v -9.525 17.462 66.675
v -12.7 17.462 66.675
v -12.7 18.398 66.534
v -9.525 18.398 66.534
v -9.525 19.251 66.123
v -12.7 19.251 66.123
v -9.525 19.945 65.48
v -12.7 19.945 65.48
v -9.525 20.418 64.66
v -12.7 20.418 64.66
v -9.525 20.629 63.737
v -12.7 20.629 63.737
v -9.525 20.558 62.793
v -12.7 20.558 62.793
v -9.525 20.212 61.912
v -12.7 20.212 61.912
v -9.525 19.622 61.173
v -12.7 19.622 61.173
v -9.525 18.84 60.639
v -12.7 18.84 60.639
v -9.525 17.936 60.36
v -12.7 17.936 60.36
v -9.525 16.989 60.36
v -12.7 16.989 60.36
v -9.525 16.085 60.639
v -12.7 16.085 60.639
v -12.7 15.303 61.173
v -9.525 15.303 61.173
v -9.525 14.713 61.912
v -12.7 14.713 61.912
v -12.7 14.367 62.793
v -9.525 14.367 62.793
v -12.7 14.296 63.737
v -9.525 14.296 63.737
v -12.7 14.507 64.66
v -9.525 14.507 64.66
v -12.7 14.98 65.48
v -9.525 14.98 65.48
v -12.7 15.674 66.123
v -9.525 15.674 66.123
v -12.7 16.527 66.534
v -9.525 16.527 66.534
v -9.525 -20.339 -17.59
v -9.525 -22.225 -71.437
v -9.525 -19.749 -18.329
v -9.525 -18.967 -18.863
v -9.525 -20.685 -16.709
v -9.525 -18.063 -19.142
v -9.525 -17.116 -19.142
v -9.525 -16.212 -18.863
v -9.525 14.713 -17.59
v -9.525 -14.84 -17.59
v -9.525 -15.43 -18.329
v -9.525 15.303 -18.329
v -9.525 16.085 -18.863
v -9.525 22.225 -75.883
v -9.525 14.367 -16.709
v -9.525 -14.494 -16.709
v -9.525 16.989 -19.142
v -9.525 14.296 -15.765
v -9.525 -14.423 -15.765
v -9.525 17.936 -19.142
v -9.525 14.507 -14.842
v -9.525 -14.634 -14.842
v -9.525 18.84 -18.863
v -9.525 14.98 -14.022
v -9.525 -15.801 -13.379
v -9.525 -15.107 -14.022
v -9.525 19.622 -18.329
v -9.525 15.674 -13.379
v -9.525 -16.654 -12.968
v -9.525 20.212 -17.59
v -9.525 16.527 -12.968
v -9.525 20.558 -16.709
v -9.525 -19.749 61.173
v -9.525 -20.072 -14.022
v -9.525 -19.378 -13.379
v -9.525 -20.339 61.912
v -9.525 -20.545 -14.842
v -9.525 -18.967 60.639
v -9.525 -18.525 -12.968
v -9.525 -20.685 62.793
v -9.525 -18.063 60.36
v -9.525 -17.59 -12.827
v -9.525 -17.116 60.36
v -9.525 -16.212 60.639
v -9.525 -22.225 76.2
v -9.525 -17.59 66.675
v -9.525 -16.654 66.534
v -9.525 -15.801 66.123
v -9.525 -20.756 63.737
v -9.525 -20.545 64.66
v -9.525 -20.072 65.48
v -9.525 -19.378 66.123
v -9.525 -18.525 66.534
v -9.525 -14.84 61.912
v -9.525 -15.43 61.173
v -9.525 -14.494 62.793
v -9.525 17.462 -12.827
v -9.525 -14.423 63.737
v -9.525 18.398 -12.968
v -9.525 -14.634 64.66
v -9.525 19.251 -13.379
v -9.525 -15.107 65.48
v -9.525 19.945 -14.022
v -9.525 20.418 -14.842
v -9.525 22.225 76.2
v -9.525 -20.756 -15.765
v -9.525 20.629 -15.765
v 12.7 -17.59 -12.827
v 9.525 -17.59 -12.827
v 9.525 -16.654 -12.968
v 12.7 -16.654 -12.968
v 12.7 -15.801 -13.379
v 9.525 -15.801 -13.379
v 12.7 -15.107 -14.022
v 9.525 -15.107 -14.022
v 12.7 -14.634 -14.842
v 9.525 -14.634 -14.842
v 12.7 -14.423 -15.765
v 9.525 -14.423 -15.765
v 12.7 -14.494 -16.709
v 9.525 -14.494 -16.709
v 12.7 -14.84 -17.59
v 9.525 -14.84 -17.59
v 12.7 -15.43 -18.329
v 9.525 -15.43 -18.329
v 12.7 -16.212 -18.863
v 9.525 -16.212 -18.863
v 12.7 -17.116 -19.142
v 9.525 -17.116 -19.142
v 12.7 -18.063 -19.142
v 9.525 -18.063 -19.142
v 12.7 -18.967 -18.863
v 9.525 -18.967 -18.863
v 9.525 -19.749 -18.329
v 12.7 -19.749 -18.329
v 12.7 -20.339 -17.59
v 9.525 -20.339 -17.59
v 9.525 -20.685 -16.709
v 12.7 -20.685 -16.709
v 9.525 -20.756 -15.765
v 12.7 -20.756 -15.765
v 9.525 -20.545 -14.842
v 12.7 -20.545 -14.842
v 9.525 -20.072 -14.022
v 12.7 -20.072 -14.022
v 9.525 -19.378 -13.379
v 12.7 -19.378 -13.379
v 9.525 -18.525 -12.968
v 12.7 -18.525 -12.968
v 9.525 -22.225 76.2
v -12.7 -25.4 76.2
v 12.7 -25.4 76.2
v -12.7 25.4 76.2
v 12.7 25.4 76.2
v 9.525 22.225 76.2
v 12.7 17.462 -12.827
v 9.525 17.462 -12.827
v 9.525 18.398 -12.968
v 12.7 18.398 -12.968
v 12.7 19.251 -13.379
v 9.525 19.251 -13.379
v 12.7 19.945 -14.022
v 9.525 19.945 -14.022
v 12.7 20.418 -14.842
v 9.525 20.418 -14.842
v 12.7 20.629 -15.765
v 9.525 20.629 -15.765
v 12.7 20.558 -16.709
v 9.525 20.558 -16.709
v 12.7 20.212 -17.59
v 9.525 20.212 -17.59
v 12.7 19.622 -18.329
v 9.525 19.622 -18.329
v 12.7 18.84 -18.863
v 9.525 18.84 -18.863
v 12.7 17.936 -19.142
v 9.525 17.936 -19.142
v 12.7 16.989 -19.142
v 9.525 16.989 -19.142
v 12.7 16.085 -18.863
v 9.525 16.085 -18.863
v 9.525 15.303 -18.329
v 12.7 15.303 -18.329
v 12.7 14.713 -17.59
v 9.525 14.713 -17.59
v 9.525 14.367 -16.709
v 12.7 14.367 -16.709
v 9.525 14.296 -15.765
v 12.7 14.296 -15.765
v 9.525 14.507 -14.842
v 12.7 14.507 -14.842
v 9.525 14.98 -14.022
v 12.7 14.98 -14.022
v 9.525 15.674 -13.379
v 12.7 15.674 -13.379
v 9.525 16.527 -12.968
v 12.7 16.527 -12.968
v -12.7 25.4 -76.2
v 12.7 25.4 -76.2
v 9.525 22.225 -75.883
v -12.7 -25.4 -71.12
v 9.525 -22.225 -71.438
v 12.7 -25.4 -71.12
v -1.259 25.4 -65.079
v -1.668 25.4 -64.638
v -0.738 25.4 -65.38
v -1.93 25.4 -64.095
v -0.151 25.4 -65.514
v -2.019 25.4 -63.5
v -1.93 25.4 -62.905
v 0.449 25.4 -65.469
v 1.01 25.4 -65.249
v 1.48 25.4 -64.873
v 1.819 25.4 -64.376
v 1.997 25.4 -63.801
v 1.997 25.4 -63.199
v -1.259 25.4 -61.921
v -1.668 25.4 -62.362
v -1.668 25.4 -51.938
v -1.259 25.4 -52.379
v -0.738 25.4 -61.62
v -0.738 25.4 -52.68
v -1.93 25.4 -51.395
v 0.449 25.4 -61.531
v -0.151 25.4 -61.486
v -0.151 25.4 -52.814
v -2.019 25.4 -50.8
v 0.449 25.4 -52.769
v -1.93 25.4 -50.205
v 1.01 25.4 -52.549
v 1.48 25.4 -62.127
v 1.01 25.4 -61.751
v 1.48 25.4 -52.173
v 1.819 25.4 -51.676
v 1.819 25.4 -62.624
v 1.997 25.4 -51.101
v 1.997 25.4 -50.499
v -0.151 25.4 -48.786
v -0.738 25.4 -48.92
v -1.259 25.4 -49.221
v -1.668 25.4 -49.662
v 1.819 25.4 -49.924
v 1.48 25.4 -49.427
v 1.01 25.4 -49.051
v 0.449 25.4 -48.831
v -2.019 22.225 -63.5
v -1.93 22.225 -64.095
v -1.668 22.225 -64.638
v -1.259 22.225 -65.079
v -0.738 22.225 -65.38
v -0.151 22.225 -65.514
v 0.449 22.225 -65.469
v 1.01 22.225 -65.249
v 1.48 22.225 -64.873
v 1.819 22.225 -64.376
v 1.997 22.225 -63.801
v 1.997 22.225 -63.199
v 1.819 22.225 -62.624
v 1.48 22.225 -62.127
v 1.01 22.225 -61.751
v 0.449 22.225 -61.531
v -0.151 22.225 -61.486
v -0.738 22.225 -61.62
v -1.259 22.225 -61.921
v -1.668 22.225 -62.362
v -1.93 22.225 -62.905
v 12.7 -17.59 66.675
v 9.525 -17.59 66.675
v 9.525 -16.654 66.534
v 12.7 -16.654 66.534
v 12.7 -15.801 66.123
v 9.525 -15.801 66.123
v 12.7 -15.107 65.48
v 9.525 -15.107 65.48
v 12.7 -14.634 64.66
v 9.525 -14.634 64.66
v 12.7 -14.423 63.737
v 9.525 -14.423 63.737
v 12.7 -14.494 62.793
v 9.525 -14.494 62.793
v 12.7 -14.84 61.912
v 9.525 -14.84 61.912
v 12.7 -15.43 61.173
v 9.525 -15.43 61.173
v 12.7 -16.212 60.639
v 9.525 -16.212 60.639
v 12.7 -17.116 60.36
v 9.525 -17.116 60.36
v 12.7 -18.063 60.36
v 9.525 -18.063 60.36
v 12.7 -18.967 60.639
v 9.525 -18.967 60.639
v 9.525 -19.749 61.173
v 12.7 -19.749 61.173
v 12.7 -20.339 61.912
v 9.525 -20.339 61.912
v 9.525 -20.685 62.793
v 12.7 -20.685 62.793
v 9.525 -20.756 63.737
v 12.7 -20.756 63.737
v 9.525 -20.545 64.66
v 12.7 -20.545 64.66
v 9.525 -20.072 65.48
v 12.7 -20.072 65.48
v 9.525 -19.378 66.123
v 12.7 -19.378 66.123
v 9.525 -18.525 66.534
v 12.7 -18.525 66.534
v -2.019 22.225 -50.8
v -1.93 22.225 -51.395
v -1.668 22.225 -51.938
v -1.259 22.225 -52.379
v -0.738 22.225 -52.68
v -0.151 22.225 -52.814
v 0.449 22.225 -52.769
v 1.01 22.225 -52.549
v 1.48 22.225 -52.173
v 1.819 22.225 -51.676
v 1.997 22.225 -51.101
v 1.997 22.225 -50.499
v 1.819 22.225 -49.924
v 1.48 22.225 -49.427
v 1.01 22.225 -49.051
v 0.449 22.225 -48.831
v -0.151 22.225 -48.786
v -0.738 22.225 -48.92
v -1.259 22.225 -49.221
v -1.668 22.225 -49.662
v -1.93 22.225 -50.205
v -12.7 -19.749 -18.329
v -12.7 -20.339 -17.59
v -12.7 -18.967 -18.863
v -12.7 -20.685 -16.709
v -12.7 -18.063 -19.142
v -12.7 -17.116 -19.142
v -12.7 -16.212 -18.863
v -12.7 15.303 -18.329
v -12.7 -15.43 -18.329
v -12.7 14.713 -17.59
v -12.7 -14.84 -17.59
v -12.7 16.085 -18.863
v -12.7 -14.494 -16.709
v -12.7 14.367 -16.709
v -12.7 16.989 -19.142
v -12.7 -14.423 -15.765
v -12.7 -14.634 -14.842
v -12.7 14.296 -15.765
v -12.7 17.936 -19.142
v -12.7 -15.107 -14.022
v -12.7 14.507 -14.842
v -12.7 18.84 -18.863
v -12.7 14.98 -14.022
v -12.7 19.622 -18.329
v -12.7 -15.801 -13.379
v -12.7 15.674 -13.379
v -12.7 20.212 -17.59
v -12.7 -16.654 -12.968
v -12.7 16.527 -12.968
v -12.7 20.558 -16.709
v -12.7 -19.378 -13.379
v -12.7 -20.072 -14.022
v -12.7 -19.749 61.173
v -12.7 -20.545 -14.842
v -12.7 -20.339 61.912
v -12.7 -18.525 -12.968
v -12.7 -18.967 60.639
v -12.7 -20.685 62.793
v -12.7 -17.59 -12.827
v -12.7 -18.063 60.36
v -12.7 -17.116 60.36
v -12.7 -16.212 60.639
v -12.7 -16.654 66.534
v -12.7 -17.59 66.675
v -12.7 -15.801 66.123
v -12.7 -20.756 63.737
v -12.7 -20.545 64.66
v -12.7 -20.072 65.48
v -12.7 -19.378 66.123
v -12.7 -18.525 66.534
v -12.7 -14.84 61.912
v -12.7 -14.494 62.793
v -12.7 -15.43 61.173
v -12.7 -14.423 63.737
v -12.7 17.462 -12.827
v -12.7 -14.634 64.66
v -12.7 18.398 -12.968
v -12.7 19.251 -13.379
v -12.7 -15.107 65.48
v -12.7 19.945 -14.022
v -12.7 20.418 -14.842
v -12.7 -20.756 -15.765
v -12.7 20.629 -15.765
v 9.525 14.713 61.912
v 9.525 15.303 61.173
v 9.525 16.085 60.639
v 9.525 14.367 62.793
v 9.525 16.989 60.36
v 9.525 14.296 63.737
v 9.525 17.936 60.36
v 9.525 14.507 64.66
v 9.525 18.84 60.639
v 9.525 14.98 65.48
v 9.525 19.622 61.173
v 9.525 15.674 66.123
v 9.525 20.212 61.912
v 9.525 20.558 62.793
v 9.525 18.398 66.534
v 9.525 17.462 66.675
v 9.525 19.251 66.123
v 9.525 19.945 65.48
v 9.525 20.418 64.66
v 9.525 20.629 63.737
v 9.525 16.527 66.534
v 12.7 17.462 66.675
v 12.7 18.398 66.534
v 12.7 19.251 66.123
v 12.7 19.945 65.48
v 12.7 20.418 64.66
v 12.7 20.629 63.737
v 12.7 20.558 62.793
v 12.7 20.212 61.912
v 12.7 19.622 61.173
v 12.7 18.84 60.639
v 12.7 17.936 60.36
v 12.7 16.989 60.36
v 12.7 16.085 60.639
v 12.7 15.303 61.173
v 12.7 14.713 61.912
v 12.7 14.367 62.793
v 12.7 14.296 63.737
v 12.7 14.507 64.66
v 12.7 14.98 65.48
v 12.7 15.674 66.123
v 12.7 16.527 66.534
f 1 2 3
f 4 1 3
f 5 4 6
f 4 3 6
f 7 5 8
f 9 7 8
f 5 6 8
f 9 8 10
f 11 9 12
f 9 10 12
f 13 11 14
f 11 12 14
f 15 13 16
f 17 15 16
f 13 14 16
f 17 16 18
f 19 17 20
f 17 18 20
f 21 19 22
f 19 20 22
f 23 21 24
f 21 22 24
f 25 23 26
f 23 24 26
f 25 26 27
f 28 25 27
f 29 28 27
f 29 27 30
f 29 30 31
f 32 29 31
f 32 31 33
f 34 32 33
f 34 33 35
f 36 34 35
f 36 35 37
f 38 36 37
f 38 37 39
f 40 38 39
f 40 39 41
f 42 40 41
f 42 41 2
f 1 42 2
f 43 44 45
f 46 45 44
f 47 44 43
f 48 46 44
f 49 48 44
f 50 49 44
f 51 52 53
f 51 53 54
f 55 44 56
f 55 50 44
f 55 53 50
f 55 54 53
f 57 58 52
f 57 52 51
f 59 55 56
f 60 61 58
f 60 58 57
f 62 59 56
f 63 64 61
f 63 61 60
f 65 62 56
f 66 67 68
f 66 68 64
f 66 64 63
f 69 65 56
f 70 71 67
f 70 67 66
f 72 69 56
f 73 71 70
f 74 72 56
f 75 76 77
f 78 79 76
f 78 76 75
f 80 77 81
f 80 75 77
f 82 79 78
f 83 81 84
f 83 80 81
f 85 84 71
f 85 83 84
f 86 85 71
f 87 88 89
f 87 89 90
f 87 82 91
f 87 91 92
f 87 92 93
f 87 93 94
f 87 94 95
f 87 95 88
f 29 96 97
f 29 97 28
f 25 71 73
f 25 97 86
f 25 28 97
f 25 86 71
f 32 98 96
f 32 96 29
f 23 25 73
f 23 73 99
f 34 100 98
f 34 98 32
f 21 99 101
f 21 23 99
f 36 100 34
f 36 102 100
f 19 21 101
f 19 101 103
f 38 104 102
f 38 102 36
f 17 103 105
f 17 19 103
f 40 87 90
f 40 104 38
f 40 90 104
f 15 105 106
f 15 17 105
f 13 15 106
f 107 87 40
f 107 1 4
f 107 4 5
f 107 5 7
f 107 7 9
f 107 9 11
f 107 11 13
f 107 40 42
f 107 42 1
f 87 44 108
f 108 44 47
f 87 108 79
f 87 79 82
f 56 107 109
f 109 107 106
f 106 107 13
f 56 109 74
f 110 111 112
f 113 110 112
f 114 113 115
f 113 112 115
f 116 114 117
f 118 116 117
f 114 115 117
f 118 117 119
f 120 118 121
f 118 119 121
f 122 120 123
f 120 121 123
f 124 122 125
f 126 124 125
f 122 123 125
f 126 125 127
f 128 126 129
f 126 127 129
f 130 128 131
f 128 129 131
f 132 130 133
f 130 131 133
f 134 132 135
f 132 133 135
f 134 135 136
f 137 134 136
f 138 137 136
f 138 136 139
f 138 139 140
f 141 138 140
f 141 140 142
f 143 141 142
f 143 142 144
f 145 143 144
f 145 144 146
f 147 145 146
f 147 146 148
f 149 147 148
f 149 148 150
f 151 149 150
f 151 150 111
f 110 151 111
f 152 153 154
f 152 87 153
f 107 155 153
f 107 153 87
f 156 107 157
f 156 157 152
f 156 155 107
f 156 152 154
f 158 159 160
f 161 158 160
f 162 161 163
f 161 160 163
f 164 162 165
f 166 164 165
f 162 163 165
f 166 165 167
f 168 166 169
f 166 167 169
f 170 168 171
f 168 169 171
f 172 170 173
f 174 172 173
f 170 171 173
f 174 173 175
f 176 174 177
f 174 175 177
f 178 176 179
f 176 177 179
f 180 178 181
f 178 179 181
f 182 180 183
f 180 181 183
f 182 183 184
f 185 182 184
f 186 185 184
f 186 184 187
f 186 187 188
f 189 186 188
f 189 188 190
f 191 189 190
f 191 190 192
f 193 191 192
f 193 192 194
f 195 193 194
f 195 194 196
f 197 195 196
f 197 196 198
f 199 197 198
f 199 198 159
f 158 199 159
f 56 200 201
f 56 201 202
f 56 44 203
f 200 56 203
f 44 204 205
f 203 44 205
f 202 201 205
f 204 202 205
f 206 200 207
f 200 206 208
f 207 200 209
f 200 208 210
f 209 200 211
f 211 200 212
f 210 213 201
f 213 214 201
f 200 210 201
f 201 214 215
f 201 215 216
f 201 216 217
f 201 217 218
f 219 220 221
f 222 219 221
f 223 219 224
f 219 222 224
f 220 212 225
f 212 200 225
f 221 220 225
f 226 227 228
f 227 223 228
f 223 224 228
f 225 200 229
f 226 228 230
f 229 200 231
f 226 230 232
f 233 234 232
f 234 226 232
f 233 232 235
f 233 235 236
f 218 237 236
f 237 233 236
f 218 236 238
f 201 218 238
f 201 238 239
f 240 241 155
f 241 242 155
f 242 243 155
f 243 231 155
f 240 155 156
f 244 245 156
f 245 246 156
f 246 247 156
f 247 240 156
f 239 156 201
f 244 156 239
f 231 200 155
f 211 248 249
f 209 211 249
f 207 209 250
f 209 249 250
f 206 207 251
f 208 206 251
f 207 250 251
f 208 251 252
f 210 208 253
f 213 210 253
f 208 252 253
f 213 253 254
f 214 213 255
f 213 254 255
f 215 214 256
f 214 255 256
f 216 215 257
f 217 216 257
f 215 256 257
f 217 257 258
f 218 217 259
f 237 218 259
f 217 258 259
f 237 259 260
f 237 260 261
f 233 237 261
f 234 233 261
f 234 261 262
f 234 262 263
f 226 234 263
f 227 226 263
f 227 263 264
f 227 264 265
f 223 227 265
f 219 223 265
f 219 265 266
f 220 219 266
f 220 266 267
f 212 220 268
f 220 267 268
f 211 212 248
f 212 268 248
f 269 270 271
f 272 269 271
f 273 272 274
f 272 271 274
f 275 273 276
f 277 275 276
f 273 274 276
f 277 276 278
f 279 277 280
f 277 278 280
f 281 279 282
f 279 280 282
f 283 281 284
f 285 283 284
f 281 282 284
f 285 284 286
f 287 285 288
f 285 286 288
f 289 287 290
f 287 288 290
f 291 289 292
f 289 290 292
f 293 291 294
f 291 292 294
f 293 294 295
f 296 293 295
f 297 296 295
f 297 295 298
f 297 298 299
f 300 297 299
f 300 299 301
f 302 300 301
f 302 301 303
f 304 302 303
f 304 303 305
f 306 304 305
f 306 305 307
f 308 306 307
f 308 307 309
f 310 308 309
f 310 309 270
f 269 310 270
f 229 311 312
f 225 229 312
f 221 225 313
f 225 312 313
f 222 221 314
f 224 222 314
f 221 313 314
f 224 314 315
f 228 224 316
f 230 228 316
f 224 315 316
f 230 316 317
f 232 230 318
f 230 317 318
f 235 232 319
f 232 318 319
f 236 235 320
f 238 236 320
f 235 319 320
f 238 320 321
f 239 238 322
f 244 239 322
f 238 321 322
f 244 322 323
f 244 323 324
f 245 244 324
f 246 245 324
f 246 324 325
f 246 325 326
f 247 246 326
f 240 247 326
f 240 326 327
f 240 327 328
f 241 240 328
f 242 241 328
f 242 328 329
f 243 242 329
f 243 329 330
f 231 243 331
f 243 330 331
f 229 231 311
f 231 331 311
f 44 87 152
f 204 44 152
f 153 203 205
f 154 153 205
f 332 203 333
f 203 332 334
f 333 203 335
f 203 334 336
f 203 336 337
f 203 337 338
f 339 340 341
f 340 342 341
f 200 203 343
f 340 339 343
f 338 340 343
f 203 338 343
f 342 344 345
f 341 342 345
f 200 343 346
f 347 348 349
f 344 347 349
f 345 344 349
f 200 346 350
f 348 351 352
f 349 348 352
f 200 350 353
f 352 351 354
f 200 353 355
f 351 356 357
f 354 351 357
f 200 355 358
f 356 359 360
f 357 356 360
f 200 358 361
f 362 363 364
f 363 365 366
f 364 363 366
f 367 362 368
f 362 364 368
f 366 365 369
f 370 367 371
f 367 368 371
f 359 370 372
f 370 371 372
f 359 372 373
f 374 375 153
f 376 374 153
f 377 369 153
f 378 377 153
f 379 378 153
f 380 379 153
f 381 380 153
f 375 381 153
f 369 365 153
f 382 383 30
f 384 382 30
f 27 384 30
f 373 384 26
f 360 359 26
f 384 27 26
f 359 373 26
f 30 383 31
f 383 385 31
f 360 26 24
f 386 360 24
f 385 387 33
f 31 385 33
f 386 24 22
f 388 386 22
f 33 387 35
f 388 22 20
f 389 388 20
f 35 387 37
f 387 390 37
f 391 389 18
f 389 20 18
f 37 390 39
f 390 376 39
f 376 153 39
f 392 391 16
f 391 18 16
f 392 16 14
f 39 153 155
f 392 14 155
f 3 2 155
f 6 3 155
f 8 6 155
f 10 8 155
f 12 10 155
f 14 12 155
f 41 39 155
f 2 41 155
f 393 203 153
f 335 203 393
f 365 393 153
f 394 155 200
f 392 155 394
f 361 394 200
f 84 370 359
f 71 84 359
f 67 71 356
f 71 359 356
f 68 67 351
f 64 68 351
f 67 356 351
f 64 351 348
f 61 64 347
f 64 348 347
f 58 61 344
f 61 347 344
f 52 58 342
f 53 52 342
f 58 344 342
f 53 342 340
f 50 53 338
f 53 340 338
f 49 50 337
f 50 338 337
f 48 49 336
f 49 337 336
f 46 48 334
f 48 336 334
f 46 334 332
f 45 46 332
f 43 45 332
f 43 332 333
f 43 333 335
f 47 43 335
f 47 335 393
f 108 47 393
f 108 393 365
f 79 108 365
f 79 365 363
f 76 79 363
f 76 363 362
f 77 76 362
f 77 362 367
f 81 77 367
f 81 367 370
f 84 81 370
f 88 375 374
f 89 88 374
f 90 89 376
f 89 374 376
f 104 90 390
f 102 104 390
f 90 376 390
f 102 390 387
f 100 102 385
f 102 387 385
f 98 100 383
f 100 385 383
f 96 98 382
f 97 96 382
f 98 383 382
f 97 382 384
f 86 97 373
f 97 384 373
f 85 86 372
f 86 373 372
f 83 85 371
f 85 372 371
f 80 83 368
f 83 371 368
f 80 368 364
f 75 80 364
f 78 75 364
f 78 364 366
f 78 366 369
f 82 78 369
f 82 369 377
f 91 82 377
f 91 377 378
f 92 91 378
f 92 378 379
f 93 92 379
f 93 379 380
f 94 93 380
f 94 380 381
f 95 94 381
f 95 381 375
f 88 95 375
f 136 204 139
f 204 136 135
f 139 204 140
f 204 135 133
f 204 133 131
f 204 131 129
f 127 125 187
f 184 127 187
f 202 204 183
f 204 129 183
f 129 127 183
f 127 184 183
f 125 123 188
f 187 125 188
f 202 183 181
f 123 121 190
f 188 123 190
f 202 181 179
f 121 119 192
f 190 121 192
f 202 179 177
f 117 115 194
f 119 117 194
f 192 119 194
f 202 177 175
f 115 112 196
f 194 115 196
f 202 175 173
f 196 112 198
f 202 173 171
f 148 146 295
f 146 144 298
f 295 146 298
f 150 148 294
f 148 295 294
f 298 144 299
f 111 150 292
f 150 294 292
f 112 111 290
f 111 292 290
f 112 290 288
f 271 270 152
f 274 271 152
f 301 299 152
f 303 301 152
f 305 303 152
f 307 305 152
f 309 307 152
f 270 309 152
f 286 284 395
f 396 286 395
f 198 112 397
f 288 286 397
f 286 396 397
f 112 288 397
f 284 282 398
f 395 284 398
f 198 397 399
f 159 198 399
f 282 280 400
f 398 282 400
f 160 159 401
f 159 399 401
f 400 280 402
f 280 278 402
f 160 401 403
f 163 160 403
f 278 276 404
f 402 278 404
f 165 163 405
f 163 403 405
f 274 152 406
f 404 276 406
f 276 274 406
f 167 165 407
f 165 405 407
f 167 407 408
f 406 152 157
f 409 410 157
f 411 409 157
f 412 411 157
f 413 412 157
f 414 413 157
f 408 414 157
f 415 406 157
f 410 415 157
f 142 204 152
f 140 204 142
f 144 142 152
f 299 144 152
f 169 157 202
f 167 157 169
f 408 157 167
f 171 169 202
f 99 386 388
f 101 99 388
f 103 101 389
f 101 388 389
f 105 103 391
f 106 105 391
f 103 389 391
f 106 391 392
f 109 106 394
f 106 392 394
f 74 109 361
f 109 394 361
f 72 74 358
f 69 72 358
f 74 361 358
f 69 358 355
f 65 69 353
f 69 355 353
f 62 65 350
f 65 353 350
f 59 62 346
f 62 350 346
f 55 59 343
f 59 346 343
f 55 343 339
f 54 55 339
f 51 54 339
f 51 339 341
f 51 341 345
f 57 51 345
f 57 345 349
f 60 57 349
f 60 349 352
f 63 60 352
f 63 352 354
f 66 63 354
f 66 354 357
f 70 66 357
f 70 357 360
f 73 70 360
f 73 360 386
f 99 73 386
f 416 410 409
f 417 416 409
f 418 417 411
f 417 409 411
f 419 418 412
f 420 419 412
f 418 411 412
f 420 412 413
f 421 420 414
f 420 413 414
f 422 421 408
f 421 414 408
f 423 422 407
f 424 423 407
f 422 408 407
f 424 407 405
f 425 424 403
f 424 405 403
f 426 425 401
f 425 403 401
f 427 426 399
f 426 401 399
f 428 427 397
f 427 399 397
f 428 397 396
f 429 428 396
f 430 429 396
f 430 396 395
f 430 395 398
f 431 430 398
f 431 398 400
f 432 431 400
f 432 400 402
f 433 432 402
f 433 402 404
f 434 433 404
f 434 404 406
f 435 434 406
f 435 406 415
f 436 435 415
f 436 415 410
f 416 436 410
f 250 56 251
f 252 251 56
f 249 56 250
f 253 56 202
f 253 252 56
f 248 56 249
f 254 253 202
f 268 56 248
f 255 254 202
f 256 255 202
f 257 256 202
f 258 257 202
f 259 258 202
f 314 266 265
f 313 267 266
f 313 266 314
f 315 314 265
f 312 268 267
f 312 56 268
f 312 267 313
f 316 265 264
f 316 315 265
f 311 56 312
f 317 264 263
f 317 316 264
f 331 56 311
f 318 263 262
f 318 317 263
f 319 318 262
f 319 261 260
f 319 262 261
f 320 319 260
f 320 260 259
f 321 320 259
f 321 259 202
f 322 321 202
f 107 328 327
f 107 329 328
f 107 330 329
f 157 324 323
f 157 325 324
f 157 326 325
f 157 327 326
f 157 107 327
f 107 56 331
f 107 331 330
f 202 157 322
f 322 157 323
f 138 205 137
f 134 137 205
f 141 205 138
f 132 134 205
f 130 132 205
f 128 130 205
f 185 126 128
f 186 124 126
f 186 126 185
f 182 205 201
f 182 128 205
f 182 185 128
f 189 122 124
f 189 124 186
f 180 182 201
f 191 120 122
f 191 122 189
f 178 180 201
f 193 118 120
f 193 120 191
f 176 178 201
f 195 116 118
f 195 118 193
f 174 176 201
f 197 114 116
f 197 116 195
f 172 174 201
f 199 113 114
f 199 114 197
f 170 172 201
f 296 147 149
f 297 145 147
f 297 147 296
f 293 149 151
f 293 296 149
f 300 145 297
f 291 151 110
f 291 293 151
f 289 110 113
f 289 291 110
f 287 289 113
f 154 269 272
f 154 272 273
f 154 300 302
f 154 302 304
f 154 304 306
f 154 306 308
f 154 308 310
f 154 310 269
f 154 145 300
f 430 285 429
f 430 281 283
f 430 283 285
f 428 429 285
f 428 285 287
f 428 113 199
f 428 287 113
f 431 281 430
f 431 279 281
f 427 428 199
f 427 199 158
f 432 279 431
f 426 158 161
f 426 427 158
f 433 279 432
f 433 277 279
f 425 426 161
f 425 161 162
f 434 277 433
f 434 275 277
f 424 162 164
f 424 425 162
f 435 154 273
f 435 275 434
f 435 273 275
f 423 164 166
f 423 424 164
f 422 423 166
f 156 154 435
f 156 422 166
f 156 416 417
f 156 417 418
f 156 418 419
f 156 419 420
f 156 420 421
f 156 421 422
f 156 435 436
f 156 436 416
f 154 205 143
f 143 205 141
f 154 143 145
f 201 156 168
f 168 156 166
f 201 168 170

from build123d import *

# Parameters (mm, degrees)
SKETCH1_W                   = 25.4
SKETCH1_H                   = 50.8
BOSS_EXTRUDE1_DEPTH         = 76.2
F_1_4_0_25_DIAMETER_HOLE1_D = 6.35
F_10_32_TAPPED_HOLE1_D      = 4.0386
F_10_32_TAPPED_HOLE1_DEPTH  = 13.716
F_10_32_TAPPED_HOLE1_TIP    = 1.213317848
CUT_EXTRUDE1_DEPTH          = 85.242269675
SKETCH9_W                   = 19.05
SKETCH9_H                   = 44.45
CUT_EXTRUDE2_DEPTH          = 156.02325632


with BuildPart() as part:
    # Sketch1 → Boss-Extrude1 (new, symmetric)
    with BuildSketch(Plane.XY):
        Rectangle(SKETCH1_W, SKETCH1_H)
    extrude(amount=BOSS_EXTRUDE1_DEPTH, both=True)

    # 1/4 (0.25) Diameter Hole1 (through all)
    with Locations(Plane(origin=(12.7, 0, 0), x_dir=(0, 0, -1), z_dir=(1, 0, 0))):
        with Locations((-63.5, 17.4625), (16.002, 17.4625), (16.002, -17.5895), (-63.5, -17.5895)):
            Hole(F_1_4_0_25_DIAMETER_HOLE1_D / 2)

    # #10-32 Tapped Hole1
    with Locations(Plane(origin=(0, 25.4, 0), x_dir=(1, 0, 0), z_dir=(0, 1, 0))):
        with Locations((0, 63.5), (0, 50.8)):
            Hole(F_10_32_TAPPED_HOLE1_D / 2, depth=F_10_32_TAPPED_HOLE1_DEPTH)
            with Locations((0, 0, -(F_10_32_TAPPED_HOLE1_DEPTH + F_10_32_TAPPED_HOLE1_TIP / 2))):  # 118° drill point
                Cone(0, F_10_32_TAPPED_HOLE1_D / 2, F_10_32_TAPPED_HOLE1_TIP, mode=Mode.SUBTRACT)

    # Sketch8 → Cut-Extrude1 (cut, through all)
    with BuildSketch(Plane(origin=(12.7, 0, 0), x_dir=(0, 0, -1), z_dir=(1, 0, 0))):
        Polygon((76.2, 25.4), (71.12, -25.4), (76.2, -25.4), align=None)
    extrude(amount=-CUT_EXTRUDE1_DEPTH, mode=Mode.SUBTRACT)

    # Sketch9 → Cut-Extrude2 (cut, through all)
    with BuildSketch(Plane.XY.offset(76.2)):
        Rectangle(SKETCH9_W, SKETCH9_H)
    extrude(amount=-CUT_EXTRUDE2_DEPTH, mode=Mode.SUBTRACT)


solid = part.part
